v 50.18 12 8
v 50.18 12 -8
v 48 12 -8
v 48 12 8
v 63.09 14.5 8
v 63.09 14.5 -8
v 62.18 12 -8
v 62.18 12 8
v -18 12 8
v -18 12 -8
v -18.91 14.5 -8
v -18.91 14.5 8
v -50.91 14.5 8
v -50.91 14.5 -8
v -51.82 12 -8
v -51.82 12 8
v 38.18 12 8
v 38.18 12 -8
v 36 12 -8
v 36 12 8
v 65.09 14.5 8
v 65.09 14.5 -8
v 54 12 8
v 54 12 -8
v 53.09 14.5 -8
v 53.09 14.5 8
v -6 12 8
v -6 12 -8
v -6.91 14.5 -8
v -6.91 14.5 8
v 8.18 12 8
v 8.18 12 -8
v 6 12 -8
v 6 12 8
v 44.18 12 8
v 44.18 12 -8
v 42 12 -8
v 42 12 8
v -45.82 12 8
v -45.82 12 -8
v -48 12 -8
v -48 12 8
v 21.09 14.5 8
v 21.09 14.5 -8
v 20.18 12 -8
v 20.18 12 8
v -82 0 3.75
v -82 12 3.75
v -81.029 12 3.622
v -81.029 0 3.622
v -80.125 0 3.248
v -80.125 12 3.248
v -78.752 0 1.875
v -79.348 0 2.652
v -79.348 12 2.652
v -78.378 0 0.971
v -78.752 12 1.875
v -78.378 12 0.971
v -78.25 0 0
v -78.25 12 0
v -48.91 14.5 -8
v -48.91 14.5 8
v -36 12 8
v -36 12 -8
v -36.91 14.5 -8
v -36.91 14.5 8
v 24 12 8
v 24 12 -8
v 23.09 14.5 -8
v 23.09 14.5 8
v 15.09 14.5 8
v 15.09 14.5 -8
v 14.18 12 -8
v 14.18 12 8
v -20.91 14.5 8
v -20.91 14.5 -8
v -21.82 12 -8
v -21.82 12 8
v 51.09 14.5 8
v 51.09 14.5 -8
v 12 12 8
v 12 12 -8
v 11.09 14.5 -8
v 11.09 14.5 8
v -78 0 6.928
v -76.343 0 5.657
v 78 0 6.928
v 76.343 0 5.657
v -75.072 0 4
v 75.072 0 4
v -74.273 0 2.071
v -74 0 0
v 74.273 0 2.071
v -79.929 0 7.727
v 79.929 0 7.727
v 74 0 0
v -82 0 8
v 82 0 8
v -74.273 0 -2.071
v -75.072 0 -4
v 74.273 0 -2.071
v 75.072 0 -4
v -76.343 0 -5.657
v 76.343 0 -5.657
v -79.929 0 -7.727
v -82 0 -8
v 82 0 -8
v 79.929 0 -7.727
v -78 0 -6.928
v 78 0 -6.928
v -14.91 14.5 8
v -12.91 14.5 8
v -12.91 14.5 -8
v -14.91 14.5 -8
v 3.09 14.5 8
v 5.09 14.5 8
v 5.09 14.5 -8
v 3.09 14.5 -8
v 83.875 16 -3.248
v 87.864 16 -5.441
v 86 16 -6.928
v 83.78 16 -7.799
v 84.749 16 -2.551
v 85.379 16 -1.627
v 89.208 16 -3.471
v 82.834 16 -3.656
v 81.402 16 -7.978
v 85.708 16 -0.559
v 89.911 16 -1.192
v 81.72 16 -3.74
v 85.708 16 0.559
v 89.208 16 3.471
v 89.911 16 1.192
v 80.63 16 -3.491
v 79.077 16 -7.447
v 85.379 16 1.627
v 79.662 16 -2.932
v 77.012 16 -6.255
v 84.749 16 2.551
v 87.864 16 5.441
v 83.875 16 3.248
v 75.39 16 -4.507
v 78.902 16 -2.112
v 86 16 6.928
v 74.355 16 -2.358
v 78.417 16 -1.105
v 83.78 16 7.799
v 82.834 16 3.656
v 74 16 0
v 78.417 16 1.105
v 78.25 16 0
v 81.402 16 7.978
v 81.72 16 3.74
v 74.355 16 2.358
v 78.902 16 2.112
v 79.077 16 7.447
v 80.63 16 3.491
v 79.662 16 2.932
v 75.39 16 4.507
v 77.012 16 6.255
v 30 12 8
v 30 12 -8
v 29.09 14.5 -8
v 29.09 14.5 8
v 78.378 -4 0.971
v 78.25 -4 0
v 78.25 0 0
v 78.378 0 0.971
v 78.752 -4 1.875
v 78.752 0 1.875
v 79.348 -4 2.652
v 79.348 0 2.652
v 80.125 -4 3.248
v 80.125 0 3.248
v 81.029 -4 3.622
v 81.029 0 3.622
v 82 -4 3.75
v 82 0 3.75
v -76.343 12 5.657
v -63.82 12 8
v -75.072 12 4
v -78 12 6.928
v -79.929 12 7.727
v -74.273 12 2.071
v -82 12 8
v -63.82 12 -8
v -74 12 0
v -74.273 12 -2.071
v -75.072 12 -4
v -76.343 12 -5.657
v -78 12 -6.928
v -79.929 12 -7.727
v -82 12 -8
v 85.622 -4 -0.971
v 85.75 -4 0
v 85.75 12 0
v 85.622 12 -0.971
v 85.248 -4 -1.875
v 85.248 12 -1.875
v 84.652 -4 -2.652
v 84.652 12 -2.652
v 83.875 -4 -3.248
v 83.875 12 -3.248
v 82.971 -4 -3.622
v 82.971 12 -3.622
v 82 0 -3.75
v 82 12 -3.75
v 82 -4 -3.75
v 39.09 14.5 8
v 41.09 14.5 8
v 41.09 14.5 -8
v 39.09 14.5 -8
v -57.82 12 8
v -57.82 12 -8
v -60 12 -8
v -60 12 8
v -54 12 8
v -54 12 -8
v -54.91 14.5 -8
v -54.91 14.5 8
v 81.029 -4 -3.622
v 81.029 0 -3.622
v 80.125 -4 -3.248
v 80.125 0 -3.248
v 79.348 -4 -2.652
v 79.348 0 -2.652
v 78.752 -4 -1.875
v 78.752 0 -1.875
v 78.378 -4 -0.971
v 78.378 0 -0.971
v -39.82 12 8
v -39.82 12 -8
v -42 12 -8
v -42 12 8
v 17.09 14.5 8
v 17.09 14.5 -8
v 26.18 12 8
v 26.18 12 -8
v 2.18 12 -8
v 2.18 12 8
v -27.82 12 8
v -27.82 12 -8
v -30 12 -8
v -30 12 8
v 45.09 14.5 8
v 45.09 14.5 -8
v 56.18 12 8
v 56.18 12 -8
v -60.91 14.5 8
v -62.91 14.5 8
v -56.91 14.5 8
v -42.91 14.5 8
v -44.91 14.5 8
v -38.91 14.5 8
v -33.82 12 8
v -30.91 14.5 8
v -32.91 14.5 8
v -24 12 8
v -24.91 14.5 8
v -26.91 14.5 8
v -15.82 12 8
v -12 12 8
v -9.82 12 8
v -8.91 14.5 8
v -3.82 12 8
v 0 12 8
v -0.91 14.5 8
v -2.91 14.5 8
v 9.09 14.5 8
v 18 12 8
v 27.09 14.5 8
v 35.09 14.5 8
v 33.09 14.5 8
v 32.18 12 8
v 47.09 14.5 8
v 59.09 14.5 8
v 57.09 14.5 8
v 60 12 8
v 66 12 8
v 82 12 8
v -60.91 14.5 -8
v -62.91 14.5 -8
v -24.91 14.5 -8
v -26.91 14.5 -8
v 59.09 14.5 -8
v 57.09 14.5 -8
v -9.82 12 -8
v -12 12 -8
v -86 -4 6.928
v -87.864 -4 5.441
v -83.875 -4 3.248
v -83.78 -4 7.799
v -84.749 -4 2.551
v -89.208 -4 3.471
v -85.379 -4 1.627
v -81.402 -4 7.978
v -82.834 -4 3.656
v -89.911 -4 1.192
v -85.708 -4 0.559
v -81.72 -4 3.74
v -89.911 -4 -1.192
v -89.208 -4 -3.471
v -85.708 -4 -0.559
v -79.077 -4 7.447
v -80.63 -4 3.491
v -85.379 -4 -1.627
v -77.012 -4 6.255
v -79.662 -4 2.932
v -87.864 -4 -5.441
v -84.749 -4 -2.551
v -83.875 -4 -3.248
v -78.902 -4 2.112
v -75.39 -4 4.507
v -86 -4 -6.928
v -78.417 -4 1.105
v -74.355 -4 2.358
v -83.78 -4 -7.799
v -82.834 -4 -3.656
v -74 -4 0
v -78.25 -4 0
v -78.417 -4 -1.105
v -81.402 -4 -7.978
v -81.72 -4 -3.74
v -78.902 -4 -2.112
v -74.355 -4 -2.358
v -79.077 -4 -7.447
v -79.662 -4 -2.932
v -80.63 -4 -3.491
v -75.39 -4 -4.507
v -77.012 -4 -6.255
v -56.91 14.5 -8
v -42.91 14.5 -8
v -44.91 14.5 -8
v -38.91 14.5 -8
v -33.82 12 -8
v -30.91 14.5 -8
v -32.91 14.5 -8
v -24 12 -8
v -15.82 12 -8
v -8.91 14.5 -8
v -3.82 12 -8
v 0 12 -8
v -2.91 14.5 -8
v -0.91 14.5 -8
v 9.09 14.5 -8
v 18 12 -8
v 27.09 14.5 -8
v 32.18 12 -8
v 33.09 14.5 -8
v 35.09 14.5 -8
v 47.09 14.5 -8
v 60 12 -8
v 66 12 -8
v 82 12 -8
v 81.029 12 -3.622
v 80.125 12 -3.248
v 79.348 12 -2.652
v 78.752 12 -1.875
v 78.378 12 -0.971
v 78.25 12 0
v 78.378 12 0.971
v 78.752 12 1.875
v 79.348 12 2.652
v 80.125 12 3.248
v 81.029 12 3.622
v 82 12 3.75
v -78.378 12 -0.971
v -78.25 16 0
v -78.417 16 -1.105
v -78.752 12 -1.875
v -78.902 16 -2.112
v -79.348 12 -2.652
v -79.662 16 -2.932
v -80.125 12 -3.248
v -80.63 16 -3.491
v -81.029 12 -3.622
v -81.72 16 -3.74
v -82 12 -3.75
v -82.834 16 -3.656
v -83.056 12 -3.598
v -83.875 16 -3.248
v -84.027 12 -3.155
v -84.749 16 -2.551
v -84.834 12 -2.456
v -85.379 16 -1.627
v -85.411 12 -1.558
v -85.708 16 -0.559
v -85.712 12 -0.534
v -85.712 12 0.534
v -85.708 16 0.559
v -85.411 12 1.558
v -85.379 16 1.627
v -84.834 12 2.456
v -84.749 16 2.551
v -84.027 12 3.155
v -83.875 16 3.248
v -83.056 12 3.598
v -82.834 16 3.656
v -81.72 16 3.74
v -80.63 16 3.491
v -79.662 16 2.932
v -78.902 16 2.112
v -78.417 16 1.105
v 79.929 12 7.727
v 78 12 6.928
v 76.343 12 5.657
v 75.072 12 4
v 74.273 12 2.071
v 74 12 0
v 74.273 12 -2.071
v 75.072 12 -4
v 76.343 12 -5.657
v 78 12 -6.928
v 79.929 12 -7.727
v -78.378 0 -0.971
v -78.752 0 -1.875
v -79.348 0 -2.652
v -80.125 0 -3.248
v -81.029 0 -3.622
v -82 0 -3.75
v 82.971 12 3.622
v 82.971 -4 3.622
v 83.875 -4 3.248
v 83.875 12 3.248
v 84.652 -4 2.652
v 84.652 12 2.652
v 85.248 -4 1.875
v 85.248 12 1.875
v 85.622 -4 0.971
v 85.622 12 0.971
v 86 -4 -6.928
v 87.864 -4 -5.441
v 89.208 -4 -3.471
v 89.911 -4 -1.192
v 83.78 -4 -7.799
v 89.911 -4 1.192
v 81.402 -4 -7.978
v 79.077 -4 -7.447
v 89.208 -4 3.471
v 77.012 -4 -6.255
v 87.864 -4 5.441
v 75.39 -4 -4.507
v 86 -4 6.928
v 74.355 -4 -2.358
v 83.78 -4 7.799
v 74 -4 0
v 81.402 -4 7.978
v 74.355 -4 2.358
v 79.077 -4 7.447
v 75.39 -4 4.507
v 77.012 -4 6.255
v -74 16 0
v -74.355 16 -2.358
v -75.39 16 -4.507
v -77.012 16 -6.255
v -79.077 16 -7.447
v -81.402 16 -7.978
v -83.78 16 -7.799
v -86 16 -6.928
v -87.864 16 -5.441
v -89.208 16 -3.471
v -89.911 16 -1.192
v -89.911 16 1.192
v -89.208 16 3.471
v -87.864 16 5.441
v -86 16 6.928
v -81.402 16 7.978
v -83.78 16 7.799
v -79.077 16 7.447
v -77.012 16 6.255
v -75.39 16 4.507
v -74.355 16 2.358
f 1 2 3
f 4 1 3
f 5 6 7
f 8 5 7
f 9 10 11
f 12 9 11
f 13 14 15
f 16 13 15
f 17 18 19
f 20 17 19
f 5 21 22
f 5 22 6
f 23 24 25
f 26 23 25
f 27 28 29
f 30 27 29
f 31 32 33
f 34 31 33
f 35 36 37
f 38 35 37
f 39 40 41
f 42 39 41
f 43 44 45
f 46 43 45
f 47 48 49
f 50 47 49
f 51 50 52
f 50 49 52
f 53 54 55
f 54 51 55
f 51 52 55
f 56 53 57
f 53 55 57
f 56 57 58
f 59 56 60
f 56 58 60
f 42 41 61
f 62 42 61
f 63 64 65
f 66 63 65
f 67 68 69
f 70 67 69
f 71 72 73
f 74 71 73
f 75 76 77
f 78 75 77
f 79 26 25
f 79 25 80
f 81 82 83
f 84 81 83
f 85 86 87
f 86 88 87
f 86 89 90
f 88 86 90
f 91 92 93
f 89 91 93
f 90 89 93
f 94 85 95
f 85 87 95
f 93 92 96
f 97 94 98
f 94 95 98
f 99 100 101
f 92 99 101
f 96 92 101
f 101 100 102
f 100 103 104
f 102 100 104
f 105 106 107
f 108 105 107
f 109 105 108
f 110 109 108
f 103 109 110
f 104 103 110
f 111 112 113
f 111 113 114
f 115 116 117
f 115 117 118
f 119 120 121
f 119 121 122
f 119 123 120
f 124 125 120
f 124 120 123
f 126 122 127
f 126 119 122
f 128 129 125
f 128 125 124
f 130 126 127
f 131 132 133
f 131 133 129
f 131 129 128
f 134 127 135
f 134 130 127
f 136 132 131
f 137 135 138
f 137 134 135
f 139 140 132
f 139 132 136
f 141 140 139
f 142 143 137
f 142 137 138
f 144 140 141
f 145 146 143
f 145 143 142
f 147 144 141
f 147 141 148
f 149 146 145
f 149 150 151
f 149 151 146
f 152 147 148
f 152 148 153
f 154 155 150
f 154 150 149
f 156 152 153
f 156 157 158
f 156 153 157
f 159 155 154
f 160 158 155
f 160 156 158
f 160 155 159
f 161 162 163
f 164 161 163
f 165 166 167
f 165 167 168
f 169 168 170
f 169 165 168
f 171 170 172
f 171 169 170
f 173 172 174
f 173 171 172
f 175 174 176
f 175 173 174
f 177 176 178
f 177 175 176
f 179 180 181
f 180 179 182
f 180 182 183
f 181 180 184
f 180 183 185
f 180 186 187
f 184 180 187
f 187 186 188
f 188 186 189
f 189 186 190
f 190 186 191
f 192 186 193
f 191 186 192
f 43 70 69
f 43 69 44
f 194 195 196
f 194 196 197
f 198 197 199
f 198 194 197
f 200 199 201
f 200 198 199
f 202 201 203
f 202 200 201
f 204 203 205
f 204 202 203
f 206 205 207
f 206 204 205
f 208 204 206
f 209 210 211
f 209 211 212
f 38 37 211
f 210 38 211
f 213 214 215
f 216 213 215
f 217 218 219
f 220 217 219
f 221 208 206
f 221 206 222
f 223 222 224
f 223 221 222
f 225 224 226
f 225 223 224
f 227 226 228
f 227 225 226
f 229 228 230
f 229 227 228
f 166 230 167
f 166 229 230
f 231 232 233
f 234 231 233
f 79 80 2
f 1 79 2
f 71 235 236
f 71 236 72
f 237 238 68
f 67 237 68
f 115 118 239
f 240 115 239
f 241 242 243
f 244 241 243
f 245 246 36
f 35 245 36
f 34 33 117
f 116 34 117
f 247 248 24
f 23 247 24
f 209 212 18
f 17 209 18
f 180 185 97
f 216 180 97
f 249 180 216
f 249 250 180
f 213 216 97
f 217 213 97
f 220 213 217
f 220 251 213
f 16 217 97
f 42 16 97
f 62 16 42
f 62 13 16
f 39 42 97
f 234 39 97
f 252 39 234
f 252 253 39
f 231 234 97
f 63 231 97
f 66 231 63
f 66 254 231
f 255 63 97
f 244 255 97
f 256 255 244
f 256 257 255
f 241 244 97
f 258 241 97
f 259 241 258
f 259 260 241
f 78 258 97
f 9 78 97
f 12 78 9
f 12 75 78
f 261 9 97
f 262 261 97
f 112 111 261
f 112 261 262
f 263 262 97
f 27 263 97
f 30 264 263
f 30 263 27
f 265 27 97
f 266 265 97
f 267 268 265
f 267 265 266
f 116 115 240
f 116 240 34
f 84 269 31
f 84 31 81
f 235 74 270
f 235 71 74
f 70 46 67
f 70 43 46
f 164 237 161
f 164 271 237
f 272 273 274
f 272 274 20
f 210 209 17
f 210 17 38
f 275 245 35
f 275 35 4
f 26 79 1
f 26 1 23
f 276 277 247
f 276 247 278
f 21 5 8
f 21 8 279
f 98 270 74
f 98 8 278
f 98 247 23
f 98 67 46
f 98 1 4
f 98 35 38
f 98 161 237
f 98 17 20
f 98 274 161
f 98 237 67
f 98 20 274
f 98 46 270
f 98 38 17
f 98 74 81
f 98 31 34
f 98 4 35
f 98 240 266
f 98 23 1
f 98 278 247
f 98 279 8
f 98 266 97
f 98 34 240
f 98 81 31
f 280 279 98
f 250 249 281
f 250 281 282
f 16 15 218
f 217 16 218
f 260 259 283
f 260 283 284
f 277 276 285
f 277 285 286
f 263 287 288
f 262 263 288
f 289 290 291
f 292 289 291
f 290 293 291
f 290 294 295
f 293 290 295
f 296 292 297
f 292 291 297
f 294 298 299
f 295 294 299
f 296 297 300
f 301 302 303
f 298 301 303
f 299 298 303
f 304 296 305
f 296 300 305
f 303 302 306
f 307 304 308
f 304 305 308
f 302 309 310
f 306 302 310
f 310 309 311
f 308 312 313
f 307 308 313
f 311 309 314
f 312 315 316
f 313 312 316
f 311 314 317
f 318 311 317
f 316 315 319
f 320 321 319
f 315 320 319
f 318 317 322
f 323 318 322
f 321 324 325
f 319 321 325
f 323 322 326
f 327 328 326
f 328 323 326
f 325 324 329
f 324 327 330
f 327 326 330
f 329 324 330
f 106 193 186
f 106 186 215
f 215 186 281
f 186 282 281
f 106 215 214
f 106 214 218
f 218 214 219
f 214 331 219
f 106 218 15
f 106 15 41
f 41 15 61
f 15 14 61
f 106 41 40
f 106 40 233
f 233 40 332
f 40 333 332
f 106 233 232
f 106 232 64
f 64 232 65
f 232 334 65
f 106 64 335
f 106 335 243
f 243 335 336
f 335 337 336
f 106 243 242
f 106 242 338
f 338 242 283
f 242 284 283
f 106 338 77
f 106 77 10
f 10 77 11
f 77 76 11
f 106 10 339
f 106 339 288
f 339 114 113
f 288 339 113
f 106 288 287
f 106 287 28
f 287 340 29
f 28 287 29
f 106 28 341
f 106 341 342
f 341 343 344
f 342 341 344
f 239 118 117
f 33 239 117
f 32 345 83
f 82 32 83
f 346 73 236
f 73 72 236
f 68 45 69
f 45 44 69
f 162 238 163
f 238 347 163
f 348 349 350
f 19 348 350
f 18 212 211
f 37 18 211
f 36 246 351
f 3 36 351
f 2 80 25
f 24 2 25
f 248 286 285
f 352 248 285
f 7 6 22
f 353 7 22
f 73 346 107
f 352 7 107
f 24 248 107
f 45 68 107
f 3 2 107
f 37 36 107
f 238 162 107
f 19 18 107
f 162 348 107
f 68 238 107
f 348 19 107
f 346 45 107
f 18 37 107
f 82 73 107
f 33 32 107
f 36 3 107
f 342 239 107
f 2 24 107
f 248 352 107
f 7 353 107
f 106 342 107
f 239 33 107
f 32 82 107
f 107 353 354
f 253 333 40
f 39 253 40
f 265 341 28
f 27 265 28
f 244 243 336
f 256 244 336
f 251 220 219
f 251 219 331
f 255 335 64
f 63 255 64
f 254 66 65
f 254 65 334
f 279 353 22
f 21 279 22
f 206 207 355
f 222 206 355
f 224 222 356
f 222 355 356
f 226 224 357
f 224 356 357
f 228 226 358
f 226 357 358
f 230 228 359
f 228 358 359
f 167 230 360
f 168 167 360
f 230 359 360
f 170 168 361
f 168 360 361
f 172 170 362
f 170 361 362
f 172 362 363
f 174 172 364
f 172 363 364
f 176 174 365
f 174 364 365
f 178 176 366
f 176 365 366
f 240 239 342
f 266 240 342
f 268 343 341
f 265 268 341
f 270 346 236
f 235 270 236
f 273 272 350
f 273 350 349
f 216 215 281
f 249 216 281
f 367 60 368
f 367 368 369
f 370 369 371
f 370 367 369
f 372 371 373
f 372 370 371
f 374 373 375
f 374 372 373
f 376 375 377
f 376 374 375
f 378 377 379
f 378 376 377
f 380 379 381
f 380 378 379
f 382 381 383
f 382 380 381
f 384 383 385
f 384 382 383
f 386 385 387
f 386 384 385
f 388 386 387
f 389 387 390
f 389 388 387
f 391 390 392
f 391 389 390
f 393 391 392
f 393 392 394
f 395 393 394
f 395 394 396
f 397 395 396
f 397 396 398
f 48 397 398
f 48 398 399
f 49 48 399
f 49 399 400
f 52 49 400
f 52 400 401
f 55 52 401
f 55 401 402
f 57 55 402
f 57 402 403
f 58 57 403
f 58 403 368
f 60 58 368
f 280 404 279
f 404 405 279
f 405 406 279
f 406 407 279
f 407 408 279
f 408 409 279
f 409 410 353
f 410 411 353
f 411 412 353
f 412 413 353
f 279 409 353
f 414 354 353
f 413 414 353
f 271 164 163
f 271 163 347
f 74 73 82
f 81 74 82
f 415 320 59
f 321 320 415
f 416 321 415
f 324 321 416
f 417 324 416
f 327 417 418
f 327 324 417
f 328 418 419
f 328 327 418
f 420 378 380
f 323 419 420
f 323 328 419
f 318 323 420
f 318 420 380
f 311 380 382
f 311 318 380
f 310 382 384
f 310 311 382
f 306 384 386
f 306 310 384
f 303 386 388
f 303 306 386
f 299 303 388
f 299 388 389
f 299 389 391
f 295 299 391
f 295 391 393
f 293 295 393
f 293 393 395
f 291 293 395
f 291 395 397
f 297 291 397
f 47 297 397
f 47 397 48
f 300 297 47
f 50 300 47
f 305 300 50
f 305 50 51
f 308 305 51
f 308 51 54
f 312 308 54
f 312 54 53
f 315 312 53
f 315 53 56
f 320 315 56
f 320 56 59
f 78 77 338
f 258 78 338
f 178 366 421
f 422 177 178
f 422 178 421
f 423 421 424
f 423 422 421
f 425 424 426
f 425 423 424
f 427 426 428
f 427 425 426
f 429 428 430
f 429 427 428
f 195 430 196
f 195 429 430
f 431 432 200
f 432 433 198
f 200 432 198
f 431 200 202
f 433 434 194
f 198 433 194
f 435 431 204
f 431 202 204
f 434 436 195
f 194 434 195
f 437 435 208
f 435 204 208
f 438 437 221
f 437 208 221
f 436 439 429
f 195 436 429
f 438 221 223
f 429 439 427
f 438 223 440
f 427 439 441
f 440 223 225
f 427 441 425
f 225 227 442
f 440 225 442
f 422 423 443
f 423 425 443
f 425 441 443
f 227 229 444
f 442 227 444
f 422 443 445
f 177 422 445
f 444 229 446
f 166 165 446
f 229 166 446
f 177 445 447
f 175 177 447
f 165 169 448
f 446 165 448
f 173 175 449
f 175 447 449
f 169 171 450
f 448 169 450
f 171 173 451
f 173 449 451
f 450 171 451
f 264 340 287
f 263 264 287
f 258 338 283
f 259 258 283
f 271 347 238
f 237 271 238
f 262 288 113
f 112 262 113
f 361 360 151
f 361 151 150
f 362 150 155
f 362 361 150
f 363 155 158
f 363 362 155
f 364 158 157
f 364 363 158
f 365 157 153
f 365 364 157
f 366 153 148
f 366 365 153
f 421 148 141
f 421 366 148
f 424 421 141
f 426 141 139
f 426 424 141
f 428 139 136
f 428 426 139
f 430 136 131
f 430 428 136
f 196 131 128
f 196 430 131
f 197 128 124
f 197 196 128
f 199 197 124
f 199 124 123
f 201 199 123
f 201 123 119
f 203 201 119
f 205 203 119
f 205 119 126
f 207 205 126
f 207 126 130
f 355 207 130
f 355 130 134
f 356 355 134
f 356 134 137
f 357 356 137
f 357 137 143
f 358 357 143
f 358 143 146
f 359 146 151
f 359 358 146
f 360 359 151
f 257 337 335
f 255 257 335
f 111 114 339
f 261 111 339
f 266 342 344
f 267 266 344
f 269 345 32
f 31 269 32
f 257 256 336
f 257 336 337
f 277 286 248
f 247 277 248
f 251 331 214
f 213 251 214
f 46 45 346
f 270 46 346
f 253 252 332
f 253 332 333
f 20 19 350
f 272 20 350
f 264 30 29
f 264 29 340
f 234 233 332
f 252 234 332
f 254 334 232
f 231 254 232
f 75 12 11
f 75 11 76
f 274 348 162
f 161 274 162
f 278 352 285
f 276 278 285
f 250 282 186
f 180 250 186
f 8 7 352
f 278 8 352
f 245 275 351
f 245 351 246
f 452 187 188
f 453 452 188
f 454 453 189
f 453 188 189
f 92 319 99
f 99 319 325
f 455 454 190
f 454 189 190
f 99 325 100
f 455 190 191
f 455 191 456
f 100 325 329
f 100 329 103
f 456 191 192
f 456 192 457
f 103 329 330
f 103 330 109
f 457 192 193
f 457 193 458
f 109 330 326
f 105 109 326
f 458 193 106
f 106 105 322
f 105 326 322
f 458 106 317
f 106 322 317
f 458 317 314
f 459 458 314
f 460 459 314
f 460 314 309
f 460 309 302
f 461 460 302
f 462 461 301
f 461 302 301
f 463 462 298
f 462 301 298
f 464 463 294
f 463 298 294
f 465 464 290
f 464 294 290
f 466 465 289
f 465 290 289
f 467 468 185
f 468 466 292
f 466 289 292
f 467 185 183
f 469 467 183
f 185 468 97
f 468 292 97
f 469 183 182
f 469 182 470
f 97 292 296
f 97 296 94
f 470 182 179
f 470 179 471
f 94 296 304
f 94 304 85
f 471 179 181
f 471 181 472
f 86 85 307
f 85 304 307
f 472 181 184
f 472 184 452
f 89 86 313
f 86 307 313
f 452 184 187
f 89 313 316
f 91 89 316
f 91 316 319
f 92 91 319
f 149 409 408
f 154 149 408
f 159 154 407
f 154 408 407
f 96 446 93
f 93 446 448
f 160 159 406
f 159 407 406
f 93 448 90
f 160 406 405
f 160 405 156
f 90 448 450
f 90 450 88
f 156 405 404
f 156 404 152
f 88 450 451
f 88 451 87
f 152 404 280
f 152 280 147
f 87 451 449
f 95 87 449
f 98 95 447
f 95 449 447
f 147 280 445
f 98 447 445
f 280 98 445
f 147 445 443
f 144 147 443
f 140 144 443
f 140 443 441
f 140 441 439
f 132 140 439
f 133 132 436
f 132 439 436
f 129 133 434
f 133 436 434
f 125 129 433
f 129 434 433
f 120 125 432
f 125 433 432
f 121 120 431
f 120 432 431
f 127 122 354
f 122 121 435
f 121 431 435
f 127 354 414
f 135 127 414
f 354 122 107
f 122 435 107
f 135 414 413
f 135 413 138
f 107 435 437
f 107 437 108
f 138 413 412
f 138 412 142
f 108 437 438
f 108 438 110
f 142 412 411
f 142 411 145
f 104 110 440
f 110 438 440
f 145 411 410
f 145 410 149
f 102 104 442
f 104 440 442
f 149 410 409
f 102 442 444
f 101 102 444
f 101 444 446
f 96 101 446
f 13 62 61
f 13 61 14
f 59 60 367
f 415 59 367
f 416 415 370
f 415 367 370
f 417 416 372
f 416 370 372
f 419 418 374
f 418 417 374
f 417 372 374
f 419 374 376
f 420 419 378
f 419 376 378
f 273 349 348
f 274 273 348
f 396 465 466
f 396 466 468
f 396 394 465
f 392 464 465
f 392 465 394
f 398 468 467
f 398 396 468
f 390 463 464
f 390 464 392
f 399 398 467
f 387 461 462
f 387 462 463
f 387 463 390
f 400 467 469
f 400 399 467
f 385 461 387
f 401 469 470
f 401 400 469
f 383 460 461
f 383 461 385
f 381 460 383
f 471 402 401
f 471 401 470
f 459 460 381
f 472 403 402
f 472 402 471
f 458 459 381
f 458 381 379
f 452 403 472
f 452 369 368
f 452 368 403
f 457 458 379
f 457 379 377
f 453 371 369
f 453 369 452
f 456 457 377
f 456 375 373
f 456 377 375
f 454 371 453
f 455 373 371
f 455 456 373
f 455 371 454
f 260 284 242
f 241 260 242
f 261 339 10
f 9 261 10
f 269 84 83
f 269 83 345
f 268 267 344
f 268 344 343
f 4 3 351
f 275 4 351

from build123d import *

# Parameters (mm, degrees)
BOSS_EXTRUDE1_DEPTH      = 8
BOSS_EXTRUDE1_DEPTH_BACK = 8
BOSS_EXTRUDE2_DEPTH      = 4
BOSS_EXTRUDE2_DEPTH_BACK = 16
SKETCH2_R                = 8
SKETCH2_R_2              = 3.75
SKETCH2_2_R              = 3.75
CUT_EXTRUDE1_DEPTH       = 16


with BuildPart() as part:
    # Sketch1 → Boss-Extrude1 (new, two sides: drawn at the far end of the back side and taken through both)
    with BuildSketch(Plane.XY.offset(-BOSS_EXTRUDE1_DEPTH_BACK)):
        Polygon((-82, 12), (-82, 0), (82, 0), (82, 12), (66, 12), (65.090074414, 14.5), (63.090074414, 14.5), (62.180148829, 12), (60, 12), (59.090074414, 14.5), (57.090074414, 14.5), (56.180148829, 12), (54, 12), (53.090074414, 14.5), (51.090074414, 14.5), (50.180148829, 12), (48, 12), (47.090074414, 14.5), (45.090074414, 14.5), (44.180148829, 12), (42, 12), (41.090074414, 14.5), (39.090074414, 14.5), (38.180148829, 12), (36, 12), (35.090074414, 14.5), (33.090074414, 14.5), (32.180148829, 12), (30, 12), (29.090074414, 14.5), (27.090074414, 14.5), (26.180148829, 12), (24, 12), (23.090074414, 14.5), (21.090074414, 14.5), (20.180148829, 12), (18, 12), (17.090074414, 14.5), (15.090074414, 14.5), (14.180148829, 12), (12, 12), (11.090074414, 14.5), (9.090074414, 14.5), (8.180148829, 12), (6, 12), (5.090074414, 14.5), (3.090074414, 14.5), (2.180148829, 12), (0, 12), (-0.909925586, 14.5), (-2.909925586, 14.5), (-3.819851171, 12), (-6, 12), (-6.909925586, 14.5), (-8.909925586, 14.5), (-9.819851171, 12), (-12, 12), (-12.909925586, 14.5), (-14.909925586, 14.5), (-15.819851171, 12), (-18, 12), (-18.909925586, 14.5), (-20.909925586, 14.5), (-21.819851171, 12), (-24, 12), (-24.909925586, 14.5), (-26.909925586, 14.5), (-27.819851171, 12), (-30, 12), (-30.909925586, 14.5), (-32.909925586, 14.5), (-33.819851171, 12), (-36, 12), (-36.909925586, 14.5), (-38.909925586, 14.5), (-39.819851171, 12), (-42, 12), (-42.909925586, 14.5), (-44.909925586, 14.5), (-45.819851171, 12), (-48, 12), (-48.909925586, 14.5), (-50.909925586, 14.5), (-51.819851171, 12), (-54, 12), (-54.909925586, 14.5), (-56.909925586, 14.5), (-57.819851171, 12), (-60, 12), (-60.909925586, 14.5), (-62.909925586, 14.5), (-63.819851171, 12), (-66, 12), align=None)
    extrude(amount=BOSS_EXTRUDE1_DEPTH + BOSS_EXTRUDE1_DEPTH_BACK)

    # Sketch2 → Boss-Extrude2 (add, two sides: drawn at the far end of the back side and taken through both)
    # profile 1 of 2: a face of its own
    with BuildSketch(Plane(origin=(0, 12, 0), x_dir=(1, 0, 0), z_dir=(0, 1, 0)).offset(-BOSS_EXTRUDE2_DEPTH_BACK)):
        with Locations((82, 0)):
            Circle(SKETCH2_R)
        with Locations((82, 0)):
            Circle(SKETCH2_R_2, mode=Mode.SUBTRACT)
    # profile 2 of 2: a face of its own
    with BuildSketch(Plane(origin=(0, 12, 0), x_dir=(1, 0, 0), z_dir=(0, 1, 0)).offset(-BOSS_EXTRUDE2_DEPTH_BACK)):
        with Locations((-82, 0)):
            Circle(SKETCH2_R)
        with Locations((-82, 0)):
            Circle(SKETCH2_R_2, mode=Mode.SUBTRACT)
    extrude(amount=BOSS_EXTRUDE2_DEPTH + BOSS_EXTRUDE2_DEPTH_BACK)

    # Sketch2<2> → Cut-Extrude1 (cut)
    with BuildSketch(Plane(origin=(0, 12, 0), x_dir=(1, 0, 0), z_dir=(0, 1, 0))):
        with Locations((82, 0)):
            Circle(SKETCH2_2_R)
        with Locations((-82, 0)):
            Circle(SKETCH2_2_R)
    extrude(amount=-CUT_EXTRUDE1_DEPTH, mode=Mode.SUBTRACT)


solid = part.part
